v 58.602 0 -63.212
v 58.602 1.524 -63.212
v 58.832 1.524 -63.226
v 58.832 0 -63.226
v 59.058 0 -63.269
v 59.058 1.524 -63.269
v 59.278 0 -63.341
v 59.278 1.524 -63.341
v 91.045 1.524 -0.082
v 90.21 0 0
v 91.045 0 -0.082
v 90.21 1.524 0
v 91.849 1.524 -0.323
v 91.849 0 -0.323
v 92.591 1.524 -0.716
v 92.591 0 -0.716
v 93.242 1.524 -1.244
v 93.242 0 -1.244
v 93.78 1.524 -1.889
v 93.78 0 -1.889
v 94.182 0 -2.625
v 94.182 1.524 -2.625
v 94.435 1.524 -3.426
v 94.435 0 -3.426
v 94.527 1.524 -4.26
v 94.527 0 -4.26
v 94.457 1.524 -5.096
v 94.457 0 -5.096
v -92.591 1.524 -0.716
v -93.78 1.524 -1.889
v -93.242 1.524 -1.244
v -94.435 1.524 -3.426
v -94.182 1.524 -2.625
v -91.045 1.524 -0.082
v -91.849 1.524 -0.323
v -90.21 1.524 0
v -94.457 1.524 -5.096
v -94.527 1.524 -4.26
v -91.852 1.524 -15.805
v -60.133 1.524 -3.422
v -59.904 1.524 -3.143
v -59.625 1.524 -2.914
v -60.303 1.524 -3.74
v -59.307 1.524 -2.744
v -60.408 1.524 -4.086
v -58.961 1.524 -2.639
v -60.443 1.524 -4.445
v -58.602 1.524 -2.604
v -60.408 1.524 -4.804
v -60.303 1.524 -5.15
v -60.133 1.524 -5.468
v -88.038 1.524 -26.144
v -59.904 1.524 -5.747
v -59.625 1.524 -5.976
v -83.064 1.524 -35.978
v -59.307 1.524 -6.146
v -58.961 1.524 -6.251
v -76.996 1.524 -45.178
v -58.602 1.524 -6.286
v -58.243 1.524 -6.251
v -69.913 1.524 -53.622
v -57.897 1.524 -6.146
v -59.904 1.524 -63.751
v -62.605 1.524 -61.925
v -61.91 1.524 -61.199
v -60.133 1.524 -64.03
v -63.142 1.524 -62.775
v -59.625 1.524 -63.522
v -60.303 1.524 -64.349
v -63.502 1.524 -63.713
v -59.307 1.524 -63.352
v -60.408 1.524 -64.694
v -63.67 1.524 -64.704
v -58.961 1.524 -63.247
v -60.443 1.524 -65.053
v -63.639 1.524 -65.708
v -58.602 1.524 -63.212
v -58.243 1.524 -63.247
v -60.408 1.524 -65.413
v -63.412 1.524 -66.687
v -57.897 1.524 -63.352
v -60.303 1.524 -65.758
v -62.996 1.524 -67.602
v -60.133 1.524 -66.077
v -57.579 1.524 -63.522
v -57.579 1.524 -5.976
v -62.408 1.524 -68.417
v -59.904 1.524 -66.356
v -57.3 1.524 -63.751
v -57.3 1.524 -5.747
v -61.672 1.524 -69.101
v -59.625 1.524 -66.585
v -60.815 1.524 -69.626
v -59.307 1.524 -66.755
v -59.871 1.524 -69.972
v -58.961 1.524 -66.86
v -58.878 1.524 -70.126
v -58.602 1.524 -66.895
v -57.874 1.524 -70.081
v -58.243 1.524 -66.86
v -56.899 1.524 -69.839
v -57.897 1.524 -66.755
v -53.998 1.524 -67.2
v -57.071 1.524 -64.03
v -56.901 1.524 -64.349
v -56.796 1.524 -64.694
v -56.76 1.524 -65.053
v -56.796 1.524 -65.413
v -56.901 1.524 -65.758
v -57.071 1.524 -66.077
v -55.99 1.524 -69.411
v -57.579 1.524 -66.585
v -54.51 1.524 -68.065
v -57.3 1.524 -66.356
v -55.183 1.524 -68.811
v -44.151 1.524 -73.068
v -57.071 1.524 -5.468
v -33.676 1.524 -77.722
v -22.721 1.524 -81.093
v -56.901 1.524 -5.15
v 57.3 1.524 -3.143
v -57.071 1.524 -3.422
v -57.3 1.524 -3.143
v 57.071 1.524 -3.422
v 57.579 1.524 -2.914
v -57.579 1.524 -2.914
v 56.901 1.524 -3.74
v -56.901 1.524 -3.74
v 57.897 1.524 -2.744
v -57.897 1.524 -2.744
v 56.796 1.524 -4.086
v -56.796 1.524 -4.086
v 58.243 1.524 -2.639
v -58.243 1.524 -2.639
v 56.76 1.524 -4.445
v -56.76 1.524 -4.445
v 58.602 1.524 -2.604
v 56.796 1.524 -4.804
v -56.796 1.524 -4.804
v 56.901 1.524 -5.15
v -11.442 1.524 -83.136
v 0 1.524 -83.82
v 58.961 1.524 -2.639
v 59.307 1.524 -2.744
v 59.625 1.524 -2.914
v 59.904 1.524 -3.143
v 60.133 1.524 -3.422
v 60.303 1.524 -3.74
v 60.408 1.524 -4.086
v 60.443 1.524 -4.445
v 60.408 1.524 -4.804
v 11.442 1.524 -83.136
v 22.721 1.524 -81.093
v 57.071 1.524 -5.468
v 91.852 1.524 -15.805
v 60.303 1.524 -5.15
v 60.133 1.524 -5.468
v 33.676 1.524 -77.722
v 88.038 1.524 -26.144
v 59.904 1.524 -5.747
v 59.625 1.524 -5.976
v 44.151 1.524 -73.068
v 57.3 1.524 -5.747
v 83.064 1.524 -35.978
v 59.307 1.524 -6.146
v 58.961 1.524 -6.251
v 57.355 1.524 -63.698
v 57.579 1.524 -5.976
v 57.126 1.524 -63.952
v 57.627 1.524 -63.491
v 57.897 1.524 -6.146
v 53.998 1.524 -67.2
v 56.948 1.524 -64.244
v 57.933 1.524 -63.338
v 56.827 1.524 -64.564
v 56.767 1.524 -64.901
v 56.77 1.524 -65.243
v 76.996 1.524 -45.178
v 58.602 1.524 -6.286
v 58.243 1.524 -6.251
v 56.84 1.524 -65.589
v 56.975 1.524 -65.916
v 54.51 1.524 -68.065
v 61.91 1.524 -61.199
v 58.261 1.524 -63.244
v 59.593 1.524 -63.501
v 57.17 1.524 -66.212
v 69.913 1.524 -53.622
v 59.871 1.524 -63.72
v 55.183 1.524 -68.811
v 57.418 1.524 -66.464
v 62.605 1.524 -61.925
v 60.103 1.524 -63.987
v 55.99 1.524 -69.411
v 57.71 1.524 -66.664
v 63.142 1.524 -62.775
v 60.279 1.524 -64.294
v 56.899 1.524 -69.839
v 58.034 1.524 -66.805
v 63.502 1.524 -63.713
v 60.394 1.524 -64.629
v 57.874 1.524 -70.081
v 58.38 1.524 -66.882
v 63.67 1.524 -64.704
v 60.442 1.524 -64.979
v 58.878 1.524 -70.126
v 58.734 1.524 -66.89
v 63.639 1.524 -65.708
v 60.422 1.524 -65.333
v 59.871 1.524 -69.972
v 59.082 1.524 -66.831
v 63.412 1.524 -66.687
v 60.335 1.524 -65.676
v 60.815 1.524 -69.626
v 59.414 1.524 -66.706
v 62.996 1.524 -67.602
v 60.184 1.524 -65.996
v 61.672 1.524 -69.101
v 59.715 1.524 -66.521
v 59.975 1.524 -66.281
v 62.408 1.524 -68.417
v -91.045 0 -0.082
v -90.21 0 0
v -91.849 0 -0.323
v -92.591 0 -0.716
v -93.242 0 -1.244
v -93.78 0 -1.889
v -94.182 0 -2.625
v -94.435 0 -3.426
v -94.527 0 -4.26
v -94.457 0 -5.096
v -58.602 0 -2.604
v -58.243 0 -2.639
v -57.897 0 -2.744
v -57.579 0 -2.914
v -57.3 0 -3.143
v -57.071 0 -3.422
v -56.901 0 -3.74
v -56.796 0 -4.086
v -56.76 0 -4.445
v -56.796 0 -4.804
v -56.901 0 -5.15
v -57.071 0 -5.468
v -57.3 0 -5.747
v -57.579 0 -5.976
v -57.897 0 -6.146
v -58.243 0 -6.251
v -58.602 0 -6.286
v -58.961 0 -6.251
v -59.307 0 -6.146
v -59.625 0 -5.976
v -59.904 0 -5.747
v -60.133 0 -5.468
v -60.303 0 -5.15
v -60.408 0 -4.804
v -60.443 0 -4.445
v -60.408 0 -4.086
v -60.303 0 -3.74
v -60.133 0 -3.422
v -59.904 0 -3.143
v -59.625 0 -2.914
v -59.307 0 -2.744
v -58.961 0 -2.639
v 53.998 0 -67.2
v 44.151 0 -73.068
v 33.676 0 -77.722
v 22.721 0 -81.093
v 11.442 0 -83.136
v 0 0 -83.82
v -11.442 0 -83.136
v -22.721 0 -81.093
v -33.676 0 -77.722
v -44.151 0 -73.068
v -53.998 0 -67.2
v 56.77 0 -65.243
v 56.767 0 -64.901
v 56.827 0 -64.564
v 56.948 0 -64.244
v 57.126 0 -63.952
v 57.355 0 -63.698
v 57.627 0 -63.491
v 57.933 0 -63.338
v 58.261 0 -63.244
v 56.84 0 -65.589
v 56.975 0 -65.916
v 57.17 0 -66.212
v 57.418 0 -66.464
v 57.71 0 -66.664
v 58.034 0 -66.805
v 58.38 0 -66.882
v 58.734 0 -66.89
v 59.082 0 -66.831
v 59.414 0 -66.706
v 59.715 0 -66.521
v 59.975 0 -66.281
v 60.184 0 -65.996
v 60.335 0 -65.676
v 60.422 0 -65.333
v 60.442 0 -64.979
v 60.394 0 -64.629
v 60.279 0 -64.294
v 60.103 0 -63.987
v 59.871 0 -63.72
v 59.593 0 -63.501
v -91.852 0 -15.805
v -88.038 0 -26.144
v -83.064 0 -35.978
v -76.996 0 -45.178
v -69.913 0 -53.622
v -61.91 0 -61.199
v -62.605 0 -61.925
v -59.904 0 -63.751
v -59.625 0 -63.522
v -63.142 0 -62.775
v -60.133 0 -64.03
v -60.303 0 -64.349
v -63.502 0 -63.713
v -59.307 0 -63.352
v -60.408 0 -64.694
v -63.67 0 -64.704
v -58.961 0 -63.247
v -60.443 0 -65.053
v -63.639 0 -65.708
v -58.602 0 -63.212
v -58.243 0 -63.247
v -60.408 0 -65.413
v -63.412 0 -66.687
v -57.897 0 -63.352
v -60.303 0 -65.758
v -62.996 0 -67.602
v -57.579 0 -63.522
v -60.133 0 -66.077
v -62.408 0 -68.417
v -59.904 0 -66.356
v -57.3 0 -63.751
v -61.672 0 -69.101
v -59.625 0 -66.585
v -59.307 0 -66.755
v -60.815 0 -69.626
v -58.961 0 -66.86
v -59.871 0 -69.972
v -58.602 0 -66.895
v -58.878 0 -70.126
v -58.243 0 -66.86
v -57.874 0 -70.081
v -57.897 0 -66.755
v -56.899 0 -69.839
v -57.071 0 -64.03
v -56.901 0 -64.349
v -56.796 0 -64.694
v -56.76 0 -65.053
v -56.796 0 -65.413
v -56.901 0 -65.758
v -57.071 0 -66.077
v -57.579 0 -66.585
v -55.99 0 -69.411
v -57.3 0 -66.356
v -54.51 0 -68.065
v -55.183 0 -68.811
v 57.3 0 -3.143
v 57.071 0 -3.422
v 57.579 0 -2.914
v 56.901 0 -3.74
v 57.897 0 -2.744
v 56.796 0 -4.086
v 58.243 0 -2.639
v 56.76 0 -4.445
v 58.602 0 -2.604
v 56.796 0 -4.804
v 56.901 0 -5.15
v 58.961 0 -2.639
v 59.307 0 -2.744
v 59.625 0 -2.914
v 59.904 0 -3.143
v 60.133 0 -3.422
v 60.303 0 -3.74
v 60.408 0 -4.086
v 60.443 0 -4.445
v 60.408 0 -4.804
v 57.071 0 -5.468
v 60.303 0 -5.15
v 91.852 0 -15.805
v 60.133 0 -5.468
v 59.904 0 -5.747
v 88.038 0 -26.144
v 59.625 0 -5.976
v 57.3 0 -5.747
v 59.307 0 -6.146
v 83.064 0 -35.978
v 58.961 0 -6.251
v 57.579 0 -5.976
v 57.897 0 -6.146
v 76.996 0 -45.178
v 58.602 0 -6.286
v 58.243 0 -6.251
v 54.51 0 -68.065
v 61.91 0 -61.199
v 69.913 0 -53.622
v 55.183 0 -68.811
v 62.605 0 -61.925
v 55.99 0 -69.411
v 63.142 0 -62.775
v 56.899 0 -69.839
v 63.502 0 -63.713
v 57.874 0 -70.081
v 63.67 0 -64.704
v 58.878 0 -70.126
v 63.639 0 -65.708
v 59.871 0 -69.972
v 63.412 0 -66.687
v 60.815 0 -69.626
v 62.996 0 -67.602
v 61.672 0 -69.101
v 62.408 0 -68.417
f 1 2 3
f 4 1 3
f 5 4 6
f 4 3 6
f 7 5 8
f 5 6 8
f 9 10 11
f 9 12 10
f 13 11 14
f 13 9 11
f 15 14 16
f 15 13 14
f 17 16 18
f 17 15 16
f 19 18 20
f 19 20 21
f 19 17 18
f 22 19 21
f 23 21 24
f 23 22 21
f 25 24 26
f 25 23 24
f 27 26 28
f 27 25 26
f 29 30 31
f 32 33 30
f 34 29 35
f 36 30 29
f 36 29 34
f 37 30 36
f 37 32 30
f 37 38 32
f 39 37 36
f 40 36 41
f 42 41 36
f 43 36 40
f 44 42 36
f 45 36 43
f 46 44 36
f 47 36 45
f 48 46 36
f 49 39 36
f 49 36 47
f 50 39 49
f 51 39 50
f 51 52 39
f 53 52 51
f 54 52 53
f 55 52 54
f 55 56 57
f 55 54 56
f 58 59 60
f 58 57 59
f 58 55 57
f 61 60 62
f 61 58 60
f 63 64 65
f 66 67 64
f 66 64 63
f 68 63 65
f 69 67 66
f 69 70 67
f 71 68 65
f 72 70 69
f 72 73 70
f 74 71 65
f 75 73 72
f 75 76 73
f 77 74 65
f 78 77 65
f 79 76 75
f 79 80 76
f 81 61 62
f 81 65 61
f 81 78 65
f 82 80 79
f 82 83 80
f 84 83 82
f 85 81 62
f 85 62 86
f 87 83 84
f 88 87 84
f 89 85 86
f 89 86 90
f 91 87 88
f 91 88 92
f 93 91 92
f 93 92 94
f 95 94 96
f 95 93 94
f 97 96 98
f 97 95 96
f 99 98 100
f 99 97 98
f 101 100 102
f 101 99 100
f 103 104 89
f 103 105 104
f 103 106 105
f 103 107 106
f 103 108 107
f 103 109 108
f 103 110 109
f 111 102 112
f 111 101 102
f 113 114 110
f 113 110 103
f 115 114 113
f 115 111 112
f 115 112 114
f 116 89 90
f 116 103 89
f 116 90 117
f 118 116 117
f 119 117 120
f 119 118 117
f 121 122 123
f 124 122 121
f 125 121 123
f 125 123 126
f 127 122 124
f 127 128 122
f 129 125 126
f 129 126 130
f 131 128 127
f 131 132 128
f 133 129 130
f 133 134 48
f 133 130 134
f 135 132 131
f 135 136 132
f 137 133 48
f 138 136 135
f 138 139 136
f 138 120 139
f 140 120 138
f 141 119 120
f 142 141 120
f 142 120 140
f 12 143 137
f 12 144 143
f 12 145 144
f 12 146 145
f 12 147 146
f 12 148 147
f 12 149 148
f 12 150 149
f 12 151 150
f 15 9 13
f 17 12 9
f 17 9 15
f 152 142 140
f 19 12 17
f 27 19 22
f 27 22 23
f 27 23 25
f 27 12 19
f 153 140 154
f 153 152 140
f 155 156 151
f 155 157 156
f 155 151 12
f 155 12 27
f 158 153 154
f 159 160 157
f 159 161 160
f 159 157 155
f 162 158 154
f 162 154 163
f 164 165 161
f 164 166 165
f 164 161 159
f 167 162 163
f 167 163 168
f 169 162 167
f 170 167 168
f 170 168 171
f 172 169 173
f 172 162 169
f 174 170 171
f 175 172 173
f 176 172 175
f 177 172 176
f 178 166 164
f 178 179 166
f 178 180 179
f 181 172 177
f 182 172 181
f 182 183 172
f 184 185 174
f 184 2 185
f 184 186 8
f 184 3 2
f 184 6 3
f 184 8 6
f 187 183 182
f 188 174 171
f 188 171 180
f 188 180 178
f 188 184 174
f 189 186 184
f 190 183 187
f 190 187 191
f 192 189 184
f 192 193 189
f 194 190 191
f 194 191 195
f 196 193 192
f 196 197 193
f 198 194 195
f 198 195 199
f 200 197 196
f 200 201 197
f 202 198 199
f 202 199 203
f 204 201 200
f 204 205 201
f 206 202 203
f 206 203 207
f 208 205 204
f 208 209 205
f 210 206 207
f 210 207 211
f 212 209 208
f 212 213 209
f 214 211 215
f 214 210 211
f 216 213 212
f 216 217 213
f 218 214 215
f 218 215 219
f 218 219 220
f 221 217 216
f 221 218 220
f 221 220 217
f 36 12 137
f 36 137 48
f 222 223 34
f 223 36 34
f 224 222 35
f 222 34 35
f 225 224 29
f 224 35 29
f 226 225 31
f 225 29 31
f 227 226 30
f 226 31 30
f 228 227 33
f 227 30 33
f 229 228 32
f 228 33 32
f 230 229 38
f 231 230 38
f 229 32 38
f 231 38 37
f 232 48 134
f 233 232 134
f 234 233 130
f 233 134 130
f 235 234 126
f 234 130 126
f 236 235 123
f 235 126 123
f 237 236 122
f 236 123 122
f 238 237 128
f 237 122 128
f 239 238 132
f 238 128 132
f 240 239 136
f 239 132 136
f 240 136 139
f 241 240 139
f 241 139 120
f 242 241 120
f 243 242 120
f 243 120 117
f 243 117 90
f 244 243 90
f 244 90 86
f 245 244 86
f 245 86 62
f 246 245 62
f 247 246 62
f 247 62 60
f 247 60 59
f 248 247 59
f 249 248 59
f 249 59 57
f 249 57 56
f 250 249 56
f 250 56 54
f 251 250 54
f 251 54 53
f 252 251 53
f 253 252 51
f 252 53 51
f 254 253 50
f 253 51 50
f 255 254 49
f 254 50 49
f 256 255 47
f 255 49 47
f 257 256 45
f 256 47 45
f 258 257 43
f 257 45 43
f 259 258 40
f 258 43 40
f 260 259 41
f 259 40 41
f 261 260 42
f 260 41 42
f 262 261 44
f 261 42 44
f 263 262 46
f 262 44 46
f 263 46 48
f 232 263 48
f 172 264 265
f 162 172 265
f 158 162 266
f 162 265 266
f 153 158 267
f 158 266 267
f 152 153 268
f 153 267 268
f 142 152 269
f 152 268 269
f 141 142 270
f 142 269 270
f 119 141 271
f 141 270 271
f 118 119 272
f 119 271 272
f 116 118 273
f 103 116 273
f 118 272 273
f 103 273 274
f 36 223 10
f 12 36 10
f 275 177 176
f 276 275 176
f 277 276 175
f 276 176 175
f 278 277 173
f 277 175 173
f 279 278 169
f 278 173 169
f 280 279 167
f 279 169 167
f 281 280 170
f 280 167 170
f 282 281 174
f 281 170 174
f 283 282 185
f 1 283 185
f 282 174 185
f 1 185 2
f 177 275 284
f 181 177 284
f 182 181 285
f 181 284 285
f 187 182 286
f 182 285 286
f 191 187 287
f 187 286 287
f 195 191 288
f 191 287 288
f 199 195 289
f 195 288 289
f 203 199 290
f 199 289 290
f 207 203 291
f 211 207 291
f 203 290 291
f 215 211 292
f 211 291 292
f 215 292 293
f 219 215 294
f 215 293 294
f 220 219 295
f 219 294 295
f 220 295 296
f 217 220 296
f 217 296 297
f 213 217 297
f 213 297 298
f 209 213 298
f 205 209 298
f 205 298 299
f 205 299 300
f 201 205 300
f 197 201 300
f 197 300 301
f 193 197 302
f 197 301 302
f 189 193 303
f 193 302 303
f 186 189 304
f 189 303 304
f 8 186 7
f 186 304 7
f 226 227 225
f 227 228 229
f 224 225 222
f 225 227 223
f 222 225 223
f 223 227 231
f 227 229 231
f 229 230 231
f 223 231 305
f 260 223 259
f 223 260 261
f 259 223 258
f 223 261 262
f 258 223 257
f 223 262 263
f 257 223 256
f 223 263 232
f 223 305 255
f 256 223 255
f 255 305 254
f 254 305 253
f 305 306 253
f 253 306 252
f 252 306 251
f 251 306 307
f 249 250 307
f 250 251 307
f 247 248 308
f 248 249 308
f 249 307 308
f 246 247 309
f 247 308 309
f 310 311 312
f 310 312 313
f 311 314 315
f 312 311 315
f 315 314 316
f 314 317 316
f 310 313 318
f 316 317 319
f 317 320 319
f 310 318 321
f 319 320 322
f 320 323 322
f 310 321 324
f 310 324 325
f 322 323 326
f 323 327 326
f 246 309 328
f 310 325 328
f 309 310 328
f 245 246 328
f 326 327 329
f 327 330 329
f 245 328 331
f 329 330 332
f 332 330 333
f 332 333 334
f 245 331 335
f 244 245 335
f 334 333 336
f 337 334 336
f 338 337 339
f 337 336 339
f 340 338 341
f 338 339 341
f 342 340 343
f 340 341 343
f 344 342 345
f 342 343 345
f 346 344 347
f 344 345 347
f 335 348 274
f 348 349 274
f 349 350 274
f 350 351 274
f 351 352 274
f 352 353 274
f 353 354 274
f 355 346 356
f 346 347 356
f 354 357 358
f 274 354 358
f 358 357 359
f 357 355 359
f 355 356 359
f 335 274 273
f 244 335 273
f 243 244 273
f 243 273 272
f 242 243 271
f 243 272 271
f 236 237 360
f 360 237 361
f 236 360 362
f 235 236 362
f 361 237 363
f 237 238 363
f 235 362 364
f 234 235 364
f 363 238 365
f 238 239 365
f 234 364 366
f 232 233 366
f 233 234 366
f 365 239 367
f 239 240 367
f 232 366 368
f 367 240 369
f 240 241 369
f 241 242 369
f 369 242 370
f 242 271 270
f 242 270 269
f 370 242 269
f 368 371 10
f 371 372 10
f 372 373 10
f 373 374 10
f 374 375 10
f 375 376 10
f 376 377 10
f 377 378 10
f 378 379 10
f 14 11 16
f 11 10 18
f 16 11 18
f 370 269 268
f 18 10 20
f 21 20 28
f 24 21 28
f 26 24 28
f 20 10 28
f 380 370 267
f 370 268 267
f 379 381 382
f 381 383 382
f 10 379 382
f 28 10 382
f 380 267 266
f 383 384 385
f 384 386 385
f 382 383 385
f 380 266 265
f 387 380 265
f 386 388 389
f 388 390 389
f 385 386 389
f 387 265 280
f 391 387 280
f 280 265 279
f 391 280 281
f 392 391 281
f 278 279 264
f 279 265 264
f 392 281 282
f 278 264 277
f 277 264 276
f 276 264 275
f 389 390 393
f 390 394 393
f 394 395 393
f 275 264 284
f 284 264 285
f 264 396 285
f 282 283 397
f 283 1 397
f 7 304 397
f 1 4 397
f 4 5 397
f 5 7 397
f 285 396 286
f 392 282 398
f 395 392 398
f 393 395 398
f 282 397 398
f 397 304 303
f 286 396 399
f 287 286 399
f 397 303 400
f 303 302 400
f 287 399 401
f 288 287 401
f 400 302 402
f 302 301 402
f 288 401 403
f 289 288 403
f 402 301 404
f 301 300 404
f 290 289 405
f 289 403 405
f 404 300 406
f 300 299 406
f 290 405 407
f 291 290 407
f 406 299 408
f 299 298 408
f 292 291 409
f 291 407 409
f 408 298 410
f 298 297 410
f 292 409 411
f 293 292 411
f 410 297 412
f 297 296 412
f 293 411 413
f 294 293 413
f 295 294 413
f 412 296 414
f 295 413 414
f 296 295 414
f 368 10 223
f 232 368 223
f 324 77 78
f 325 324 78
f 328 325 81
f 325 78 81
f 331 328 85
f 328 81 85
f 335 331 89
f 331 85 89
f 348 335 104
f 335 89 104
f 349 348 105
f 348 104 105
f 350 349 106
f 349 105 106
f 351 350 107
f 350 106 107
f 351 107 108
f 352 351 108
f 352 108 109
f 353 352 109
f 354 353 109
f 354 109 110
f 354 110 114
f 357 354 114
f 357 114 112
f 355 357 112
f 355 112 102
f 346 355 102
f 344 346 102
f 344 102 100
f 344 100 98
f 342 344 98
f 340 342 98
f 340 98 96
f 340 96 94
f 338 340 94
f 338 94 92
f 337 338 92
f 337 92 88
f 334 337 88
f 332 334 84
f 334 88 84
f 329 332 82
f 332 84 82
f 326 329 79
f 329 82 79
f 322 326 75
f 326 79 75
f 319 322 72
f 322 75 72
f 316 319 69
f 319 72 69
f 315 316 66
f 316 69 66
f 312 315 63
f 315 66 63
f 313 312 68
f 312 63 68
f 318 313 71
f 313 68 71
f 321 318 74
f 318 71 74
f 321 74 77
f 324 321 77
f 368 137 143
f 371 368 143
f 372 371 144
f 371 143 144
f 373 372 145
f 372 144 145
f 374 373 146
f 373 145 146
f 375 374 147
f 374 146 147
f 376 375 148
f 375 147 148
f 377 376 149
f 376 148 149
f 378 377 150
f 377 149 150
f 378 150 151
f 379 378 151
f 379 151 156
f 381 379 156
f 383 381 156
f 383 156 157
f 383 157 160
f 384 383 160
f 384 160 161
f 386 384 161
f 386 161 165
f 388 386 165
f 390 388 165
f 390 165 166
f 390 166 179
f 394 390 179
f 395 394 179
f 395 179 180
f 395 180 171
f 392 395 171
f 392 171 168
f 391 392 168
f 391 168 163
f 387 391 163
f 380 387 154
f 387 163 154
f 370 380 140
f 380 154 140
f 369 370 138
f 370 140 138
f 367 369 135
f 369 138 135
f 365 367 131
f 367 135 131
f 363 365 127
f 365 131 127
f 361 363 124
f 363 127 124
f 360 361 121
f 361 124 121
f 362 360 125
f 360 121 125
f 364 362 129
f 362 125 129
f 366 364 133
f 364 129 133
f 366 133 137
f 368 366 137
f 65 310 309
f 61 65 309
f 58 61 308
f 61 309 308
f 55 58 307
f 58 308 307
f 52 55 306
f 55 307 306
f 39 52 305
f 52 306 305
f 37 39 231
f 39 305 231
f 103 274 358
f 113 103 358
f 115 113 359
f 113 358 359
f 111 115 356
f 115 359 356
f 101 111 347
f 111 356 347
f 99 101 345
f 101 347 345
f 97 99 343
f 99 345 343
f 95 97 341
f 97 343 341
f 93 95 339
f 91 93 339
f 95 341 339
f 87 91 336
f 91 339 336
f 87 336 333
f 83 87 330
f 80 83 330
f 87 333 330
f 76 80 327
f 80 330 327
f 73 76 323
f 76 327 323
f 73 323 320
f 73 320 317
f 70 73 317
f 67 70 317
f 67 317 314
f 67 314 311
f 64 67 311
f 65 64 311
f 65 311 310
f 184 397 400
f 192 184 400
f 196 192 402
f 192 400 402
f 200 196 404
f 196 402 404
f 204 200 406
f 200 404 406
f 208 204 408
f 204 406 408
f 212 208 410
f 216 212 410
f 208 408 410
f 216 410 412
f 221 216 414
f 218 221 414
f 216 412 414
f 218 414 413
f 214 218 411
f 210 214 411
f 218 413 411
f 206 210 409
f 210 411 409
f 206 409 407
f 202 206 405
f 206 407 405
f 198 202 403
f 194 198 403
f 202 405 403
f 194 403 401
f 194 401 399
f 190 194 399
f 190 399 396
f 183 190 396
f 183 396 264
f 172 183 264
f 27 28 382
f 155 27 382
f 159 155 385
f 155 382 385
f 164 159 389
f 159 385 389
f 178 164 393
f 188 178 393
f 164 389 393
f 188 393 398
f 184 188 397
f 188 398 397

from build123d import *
from build123d.topology import SkipClean

# Parameters (mm, degrees)
BOSS_EXTRU_1_DEPTH      = 1.524
CONG_1_R                = 4.318
BOSS_EXTRU_3_START      = -1.524
BOSS_EXTRU_3_DEPTH      = 1.524
ESQUISSE3_R             = 1.8415
ENL_V_MAT_EXTRU_1_DEPTH = 127.347243097


with BuildPart() as part:
    # Esquisse1 → Boss.-Extru.1 (new body)
    with BuildSketch(Plane(origin=(0, 0, 0), x_dir=(1, 0, 0), z_dir=(0, 1, 0))):
        with BuildLine():
            Line((-95.25, 0), (95.25, 0))
            ThreePointArc((95.25, 0), (0, 83.82), (-95.25, 0))
        make_face()
    extrude(amount=BOSS_EXTRU_1_DEPTH)

    # Congé1
    cong_1_edges = [part.edges().sort_by_distance(p)[0] for p in [
        (-95.25, 0.762, 0),
        (95.25, 0.762, 0),
    ]]
    fillet(cong_1_edges, radius=CONG_1_R)

    # Esquisse2 → Boss.-Extru.3 (add)
    with BuildSketch(Plane(origin=(0, 1.524, 0), x_dir=(1, 0, 0), z_dir=(0, 1, 0)).offset(BOSS_EXTRU_3_START)):
        with BuildLine():
            ThreePointArc((61.910418509, 61.198651621), (61.671752387, 69.100962488), (53.997726446, 67.200224627))
            ThreePointArc((53.997726446, 67.200224627), (55.392549752, 66.233625302), (56.770074378, 65.24252883))
            ThreePointArc((56.770074378, 65.24252883), (59.71468664, 66.520695851), (59.277757535, 63.340515783))
            ThreePointArc((59.277757535, 63.340515783), (60.60355104, 62.281215121), (61.910418509, 61.198651621))
        make_face()
        with BuildLine():
            ThreePointArc((-53.997726446, 67.200224627), (-61.671752387, 69.100962488), (-61.910418509, 61.198651621))
            ThreePointArc((-61.910418509, 61.198651621), (-58.031708887, 64.301796789), (-53.997726446, 67.200224627))
        make_face()
    extrude(amount=BOSS_EXTRU_3_DEPTH)

    # Esquisse3 → Enlèv. mat.-Extru.1 (cut, through all)
    with SkipClean():  # the faces are left unmerged after this step: merging them gives an invalid solid
        with BuildSketch(Plane(origin=(0, 1.524, 0), x_dir=(1, 0, 0), z_dir=(0, 1, 0))):
            with Locations(Location((58.601845334, 65.053485411, 0), (0, 0, 270))):
                Circle(ESQUISSE3_R)
            with Locations(Location((-58.601845334, 65.053485411, 0), (0, 0, 270))):
                Circle(ESQUISSE3_R)
            with Locations(Location((58.601845334, 4.445, 0), (0, 0, 270))):
                Circle(ESQUISSE3_R)
            with Locations(Location((-58.601845334, 4.445, 0), (0, 0, 270))):
                Circle(ESQUISSE3_R)
        extrude(amount=-ENL_V_MAT_EXTRU_1_DEPTH, mode=Mode.SUBTRACT)


solid = part.part
